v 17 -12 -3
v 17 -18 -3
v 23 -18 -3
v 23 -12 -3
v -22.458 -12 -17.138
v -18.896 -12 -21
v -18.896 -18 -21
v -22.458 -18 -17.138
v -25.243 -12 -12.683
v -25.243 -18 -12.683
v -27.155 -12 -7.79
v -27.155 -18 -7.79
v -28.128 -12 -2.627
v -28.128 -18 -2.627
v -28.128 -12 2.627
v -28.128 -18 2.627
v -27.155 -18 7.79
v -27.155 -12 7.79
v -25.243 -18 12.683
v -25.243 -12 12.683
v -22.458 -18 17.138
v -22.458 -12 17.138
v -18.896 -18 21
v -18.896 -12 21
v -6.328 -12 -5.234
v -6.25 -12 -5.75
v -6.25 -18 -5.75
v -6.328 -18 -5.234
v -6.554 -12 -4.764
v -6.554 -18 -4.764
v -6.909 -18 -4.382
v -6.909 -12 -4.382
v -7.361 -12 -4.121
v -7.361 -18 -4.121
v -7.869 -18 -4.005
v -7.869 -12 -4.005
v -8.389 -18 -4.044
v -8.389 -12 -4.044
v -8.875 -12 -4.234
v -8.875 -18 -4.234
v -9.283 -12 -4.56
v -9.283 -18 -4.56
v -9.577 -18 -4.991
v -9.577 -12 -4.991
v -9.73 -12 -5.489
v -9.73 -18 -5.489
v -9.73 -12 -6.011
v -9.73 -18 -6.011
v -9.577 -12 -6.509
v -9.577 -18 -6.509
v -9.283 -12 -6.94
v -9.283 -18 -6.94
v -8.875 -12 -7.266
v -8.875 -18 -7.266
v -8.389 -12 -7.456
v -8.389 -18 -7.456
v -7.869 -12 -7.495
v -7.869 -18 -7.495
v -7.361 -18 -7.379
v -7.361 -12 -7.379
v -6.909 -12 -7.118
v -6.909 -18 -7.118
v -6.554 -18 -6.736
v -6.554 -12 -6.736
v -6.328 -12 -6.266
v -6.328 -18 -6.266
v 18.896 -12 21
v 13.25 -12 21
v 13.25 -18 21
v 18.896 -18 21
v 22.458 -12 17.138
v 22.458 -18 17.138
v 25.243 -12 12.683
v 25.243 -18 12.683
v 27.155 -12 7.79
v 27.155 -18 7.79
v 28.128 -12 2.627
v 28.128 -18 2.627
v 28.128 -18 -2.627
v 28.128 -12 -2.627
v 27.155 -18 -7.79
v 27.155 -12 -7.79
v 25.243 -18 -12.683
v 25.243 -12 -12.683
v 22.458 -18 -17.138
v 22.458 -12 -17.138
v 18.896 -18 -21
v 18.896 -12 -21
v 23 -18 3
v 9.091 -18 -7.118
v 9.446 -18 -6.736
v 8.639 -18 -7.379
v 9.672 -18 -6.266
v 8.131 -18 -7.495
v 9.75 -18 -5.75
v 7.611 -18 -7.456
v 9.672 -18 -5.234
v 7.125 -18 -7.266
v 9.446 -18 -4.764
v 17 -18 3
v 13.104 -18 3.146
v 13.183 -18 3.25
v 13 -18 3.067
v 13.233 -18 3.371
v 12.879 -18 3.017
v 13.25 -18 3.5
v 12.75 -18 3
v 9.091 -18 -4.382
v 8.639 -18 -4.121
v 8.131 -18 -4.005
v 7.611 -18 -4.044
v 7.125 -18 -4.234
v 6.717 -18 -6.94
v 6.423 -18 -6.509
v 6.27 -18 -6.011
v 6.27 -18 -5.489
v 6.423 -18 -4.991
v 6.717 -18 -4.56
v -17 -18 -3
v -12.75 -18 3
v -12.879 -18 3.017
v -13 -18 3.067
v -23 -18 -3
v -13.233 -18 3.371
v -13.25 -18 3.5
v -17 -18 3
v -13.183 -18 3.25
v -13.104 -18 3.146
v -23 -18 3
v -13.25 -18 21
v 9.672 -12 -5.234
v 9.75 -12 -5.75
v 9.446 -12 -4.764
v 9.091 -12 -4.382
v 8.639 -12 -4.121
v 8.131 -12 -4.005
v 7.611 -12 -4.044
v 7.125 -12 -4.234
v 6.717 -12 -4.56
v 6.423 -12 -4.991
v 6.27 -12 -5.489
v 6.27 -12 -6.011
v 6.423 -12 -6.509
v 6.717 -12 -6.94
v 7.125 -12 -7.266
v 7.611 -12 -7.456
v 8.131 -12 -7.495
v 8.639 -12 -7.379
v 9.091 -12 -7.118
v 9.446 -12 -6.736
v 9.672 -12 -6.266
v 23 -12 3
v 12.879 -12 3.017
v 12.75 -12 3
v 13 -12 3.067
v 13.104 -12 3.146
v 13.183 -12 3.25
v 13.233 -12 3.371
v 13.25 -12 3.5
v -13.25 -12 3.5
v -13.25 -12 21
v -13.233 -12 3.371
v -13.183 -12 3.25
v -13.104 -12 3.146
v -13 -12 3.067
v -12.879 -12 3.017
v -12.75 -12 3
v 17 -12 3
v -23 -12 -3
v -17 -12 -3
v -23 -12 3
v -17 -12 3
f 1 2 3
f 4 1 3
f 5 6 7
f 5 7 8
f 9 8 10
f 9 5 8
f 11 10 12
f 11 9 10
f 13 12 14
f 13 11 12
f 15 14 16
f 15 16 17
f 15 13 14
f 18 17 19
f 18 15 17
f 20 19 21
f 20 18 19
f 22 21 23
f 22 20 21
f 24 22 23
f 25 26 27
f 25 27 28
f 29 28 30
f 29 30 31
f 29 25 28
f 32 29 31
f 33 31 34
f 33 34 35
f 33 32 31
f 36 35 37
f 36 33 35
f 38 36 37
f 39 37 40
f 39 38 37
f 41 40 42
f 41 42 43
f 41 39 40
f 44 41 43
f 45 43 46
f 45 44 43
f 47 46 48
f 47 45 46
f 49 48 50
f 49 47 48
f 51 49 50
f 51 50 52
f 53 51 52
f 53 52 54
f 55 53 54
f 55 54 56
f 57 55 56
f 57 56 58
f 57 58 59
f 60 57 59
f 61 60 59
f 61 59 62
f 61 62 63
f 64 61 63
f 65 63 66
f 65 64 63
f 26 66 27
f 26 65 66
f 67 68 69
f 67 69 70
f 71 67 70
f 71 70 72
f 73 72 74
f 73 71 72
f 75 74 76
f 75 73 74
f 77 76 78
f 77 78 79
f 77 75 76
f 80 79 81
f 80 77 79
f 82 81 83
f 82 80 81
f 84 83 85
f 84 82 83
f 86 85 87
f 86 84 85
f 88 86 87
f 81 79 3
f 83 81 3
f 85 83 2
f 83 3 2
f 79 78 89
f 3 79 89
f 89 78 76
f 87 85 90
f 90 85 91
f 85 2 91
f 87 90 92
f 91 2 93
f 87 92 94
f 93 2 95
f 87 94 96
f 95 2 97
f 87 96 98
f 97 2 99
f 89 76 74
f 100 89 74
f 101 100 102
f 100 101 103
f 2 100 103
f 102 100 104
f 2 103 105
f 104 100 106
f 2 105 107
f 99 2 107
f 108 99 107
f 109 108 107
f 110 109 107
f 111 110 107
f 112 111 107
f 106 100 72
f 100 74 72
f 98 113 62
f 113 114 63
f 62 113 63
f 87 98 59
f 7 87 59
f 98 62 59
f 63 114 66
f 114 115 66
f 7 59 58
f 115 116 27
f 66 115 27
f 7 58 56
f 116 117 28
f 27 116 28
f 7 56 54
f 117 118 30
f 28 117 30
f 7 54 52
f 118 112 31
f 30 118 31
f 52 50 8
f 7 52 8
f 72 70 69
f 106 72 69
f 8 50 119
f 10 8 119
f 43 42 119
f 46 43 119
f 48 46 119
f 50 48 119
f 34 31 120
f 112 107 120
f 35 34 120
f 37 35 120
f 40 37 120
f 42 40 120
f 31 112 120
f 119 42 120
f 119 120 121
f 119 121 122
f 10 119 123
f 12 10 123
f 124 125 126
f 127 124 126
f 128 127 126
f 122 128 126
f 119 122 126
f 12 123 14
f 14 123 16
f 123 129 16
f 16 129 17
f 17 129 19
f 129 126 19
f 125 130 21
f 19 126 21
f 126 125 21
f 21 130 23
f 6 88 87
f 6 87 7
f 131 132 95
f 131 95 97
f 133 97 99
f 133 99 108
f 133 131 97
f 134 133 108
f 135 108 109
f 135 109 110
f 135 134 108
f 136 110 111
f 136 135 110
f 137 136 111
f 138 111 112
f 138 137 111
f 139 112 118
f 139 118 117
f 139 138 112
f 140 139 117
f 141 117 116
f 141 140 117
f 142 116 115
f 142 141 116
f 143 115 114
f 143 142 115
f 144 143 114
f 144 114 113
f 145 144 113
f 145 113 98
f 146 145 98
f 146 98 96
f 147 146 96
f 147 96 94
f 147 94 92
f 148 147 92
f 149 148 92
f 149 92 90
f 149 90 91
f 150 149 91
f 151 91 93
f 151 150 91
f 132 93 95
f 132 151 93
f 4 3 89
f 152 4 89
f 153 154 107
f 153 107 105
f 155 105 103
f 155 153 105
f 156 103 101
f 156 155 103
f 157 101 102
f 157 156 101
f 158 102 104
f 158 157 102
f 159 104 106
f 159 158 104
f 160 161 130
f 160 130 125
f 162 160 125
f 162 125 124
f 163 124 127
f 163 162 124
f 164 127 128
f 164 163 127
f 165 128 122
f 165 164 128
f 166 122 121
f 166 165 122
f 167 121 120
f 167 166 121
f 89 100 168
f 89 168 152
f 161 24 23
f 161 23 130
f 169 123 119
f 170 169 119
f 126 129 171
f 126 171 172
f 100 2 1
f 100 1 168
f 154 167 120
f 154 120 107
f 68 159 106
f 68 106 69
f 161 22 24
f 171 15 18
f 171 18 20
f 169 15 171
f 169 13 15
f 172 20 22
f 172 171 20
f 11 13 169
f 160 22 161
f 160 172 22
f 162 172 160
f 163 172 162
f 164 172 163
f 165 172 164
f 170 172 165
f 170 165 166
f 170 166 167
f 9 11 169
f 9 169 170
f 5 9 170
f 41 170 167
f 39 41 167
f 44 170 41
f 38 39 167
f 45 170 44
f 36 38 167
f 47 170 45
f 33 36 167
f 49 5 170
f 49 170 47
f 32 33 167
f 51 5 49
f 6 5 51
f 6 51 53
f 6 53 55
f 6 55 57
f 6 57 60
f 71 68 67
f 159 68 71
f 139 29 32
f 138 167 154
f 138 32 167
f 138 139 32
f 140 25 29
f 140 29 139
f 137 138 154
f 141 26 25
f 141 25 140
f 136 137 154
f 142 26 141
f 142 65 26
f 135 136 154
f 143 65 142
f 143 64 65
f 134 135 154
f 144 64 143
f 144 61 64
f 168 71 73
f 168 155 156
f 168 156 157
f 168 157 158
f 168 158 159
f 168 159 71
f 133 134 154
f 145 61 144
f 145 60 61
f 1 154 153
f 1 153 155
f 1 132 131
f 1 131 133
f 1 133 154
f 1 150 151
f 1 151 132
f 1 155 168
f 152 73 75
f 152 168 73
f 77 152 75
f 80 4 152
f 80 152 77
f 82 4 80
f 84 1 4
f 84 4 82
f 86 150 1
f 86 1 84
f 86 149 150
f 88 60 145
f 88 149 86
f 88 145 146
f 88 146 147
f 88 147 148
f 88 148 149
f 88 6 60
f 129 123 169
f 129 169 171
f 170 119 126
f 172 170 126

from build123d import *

# Parameters (mm, degrees)
SALIENTE_EXTRUIR1_DEPTH = 6
CROQUIS7_R              = 40
SALIENTE_EXTRUIR5_DEPTH = 6
SALIENTE_EXTRUIR3_DEPTH = 6
CROQUIS6_R              = 1.75
SALIENTE_EXTRUIR4_DEPTH = 6
CROQUIS8_W              = 6
CROQUIS8_H              = 6
CORTAR_EXTRUIR1_DEPTH   = 25
CROQUIS9_W              = 322
CROQUIS9_H              = 247
CORTAR_EXTRUIR2_DEPTH   = 12
CROQUIS10_R             = 28.25
CORTAR_EXTRUIR3_DEPTH   = 6


with BuildPart() as part:
    # Croquis1 → Saliente-Extruir1 (new body)
    with BuildSketch(Plane(origin=(0, 0, 0), x_dir=(1, 0, 0), z_dir=(0, 1, 0))):
        with BuildLine():
            Line((-161, 103.5), (-38.791887254, 9.756509788))
            ThreePointArc((-38.791887254, 9.756509788), (-40, 0), (-38.791887254, -9.756509788))
            Line((-38.791887254, -9.756509788), (-161, -103.5))
            Line((-161, -103.5), (-161, -123.5))
            Line((-161, -123.5), (-141, -123.5))
            Line((-141, -123.5), (-22.823766962, -32.84928708))
            ThreePointArc((-22.823766962, -32.84928708), (0, -40), (22.823766962, -32.84928708))
            Line((22.823766962, -32.84928708), (141, -123.5))
            Line((141, -123.5), (161, -123.5))
            Line((161, -123.5), (161, -103.5))
            Line((161, -103.5), (38.791887254, -9.756509788))
            ThreePointArc((38.791887254, -9.756509788), (40, 0), (38.791887254, 9.756509788))
            Line((38.791887254, 9.756509788), (161, 103.5))
            Line((161, 103.5), (161, 123.5))
            Line((161, 123.5), (141, 123.5))
            Line((141, 123.5), (22.823766962, 32.84928708))
            ThreePointArc((22.823766962, 32.84928708), (0, 40), (-22.823766962, 32.84928708))
            Line((-22.823766962, 32.84928708), (-141, 123.5))
            Line((-141, 123.5), (-161, 123.5))
            Line((-161, 123.5), (-161, 103.5))
        make_face()
    extrude(amount=SALIENTE_EXTRUIR1_DEPTH)

    # Croquis7 → Saliente-Extruir5 (add)
    with BuildSketch(Plane(origin=(0, 0, 0), x_dir=(-1, 0, 0), z_dir=(0, -1, 0))):
        Circle(CROQUIS7_R)
    extrude(amount=SALIENTE_EXTRUIR5_DEPTH)

    # Croquis5 → Saliente-Extruir3 (add)
    with BuildSketch(Plane.XZ.offset(6)):
        with BuildLine():
            Line((18.896097481, -21), (-18.896097481, -21))
            ThreePointArc((-18.896097481, -21), (-28.25, 0), (-18.896097481, 21))
            Line((-18.896097481, 21), (-13.25, 21))
            Line((-13.25, 21), (-13.25, -11))
            Line((-13.25, -11), (13.25, -11))
            Line((13.25, -11), (13.25, 21))
            Line((13.25, 21), (18.896097481, 21))
            ThreePointArc((18.896097481, 21), (28.25, 0), (18.896097481, -21))
        make_face()
    extrude(amount=SALIENTE_EXTRUIR3_DEPTH)

    # Croquis6 → Saliente-Extruir4 (add)
    with BuildSketch(Plane.XZ.offset(12)):
        with BuildLine():
            Line((-18.896097481, 21), (-13.25, 21))
            Line((-13.25, 21), (-13.25, 3.5))
            ThreePointArc((-13.25, 3.5), (-13.103553391, 3.146446609), (-12.75, 3))
            Line((-12.75, 3), (12.75, 3))
            ThreePointArc((12.75, 3), (13.103553391, 3.146446609), (13.25, 3.5))
            Line((13.25, 3.5), (13.25, 21))
            Line((13.25, 21), (18.896097481, 21))
            ThreePointArc((18.896097481, 21), (28.25, 0), (18.896097481, -21))
            Line((18.896097481, -21), (-18.896097481, -21))
            ThreePointArc((-18.896097481, -21), (-28.25, 0), (-18.896097481, 21))
        make_face()
        with Locations((-8, -5.75)):
            Circle(CROQUIS6_R, mode=Mode.SUBTRACT)
        with Locations((8, -5.75)):
            Circle(CROQUIS6_R, mode=Mode.SUBTRACT)
    extrude(amount=SALIENTE_EXTRUIR4_DEPTH)

    # Croquis8 → Cortar-Extruir1 (cut, through all)
    with BuildSketch(Plane.XZ.offset(18)):
        with Locations((-20, 0)):
            Rectangle(CROQUIS8_W, CROQUIS8_H)
        with Locations((20, 0)):
            Rectangle(CROQUIS8_W, CROQUIS8_H)
    extrude(amount=-CORTAR_EXTRUIR1_DEPTH, mode=Mode.SUBTRACT)

    # Croquis9 → Cortar-Extruir2 (cut)
    with BuildSketch(Plane(origin=(0, 6, 0), x_dir=(1, 0, 0), z_dir=(0, 1, 0))):
        Rectangle(CROQUIS9_W, CROQUIS9_H)
    extrude(amount=-CORTAR_EXTRUIR2_DEPTH, mode=Mode.SUBTRACT)

    # Croquis10 → Cortar-Extruir3 (cut)
    with BuildSketch(Plane(origin=(0, -6, 0), x_dir=(1, 0, 0), z_dir=(0, 1, 0))):
        Circle(CROQUIS10_R)
    extrude(amount=-CORTAR_EXTRUIR3_DEPTH, mode=Mode.SUBTRACT)


solid = part.part
